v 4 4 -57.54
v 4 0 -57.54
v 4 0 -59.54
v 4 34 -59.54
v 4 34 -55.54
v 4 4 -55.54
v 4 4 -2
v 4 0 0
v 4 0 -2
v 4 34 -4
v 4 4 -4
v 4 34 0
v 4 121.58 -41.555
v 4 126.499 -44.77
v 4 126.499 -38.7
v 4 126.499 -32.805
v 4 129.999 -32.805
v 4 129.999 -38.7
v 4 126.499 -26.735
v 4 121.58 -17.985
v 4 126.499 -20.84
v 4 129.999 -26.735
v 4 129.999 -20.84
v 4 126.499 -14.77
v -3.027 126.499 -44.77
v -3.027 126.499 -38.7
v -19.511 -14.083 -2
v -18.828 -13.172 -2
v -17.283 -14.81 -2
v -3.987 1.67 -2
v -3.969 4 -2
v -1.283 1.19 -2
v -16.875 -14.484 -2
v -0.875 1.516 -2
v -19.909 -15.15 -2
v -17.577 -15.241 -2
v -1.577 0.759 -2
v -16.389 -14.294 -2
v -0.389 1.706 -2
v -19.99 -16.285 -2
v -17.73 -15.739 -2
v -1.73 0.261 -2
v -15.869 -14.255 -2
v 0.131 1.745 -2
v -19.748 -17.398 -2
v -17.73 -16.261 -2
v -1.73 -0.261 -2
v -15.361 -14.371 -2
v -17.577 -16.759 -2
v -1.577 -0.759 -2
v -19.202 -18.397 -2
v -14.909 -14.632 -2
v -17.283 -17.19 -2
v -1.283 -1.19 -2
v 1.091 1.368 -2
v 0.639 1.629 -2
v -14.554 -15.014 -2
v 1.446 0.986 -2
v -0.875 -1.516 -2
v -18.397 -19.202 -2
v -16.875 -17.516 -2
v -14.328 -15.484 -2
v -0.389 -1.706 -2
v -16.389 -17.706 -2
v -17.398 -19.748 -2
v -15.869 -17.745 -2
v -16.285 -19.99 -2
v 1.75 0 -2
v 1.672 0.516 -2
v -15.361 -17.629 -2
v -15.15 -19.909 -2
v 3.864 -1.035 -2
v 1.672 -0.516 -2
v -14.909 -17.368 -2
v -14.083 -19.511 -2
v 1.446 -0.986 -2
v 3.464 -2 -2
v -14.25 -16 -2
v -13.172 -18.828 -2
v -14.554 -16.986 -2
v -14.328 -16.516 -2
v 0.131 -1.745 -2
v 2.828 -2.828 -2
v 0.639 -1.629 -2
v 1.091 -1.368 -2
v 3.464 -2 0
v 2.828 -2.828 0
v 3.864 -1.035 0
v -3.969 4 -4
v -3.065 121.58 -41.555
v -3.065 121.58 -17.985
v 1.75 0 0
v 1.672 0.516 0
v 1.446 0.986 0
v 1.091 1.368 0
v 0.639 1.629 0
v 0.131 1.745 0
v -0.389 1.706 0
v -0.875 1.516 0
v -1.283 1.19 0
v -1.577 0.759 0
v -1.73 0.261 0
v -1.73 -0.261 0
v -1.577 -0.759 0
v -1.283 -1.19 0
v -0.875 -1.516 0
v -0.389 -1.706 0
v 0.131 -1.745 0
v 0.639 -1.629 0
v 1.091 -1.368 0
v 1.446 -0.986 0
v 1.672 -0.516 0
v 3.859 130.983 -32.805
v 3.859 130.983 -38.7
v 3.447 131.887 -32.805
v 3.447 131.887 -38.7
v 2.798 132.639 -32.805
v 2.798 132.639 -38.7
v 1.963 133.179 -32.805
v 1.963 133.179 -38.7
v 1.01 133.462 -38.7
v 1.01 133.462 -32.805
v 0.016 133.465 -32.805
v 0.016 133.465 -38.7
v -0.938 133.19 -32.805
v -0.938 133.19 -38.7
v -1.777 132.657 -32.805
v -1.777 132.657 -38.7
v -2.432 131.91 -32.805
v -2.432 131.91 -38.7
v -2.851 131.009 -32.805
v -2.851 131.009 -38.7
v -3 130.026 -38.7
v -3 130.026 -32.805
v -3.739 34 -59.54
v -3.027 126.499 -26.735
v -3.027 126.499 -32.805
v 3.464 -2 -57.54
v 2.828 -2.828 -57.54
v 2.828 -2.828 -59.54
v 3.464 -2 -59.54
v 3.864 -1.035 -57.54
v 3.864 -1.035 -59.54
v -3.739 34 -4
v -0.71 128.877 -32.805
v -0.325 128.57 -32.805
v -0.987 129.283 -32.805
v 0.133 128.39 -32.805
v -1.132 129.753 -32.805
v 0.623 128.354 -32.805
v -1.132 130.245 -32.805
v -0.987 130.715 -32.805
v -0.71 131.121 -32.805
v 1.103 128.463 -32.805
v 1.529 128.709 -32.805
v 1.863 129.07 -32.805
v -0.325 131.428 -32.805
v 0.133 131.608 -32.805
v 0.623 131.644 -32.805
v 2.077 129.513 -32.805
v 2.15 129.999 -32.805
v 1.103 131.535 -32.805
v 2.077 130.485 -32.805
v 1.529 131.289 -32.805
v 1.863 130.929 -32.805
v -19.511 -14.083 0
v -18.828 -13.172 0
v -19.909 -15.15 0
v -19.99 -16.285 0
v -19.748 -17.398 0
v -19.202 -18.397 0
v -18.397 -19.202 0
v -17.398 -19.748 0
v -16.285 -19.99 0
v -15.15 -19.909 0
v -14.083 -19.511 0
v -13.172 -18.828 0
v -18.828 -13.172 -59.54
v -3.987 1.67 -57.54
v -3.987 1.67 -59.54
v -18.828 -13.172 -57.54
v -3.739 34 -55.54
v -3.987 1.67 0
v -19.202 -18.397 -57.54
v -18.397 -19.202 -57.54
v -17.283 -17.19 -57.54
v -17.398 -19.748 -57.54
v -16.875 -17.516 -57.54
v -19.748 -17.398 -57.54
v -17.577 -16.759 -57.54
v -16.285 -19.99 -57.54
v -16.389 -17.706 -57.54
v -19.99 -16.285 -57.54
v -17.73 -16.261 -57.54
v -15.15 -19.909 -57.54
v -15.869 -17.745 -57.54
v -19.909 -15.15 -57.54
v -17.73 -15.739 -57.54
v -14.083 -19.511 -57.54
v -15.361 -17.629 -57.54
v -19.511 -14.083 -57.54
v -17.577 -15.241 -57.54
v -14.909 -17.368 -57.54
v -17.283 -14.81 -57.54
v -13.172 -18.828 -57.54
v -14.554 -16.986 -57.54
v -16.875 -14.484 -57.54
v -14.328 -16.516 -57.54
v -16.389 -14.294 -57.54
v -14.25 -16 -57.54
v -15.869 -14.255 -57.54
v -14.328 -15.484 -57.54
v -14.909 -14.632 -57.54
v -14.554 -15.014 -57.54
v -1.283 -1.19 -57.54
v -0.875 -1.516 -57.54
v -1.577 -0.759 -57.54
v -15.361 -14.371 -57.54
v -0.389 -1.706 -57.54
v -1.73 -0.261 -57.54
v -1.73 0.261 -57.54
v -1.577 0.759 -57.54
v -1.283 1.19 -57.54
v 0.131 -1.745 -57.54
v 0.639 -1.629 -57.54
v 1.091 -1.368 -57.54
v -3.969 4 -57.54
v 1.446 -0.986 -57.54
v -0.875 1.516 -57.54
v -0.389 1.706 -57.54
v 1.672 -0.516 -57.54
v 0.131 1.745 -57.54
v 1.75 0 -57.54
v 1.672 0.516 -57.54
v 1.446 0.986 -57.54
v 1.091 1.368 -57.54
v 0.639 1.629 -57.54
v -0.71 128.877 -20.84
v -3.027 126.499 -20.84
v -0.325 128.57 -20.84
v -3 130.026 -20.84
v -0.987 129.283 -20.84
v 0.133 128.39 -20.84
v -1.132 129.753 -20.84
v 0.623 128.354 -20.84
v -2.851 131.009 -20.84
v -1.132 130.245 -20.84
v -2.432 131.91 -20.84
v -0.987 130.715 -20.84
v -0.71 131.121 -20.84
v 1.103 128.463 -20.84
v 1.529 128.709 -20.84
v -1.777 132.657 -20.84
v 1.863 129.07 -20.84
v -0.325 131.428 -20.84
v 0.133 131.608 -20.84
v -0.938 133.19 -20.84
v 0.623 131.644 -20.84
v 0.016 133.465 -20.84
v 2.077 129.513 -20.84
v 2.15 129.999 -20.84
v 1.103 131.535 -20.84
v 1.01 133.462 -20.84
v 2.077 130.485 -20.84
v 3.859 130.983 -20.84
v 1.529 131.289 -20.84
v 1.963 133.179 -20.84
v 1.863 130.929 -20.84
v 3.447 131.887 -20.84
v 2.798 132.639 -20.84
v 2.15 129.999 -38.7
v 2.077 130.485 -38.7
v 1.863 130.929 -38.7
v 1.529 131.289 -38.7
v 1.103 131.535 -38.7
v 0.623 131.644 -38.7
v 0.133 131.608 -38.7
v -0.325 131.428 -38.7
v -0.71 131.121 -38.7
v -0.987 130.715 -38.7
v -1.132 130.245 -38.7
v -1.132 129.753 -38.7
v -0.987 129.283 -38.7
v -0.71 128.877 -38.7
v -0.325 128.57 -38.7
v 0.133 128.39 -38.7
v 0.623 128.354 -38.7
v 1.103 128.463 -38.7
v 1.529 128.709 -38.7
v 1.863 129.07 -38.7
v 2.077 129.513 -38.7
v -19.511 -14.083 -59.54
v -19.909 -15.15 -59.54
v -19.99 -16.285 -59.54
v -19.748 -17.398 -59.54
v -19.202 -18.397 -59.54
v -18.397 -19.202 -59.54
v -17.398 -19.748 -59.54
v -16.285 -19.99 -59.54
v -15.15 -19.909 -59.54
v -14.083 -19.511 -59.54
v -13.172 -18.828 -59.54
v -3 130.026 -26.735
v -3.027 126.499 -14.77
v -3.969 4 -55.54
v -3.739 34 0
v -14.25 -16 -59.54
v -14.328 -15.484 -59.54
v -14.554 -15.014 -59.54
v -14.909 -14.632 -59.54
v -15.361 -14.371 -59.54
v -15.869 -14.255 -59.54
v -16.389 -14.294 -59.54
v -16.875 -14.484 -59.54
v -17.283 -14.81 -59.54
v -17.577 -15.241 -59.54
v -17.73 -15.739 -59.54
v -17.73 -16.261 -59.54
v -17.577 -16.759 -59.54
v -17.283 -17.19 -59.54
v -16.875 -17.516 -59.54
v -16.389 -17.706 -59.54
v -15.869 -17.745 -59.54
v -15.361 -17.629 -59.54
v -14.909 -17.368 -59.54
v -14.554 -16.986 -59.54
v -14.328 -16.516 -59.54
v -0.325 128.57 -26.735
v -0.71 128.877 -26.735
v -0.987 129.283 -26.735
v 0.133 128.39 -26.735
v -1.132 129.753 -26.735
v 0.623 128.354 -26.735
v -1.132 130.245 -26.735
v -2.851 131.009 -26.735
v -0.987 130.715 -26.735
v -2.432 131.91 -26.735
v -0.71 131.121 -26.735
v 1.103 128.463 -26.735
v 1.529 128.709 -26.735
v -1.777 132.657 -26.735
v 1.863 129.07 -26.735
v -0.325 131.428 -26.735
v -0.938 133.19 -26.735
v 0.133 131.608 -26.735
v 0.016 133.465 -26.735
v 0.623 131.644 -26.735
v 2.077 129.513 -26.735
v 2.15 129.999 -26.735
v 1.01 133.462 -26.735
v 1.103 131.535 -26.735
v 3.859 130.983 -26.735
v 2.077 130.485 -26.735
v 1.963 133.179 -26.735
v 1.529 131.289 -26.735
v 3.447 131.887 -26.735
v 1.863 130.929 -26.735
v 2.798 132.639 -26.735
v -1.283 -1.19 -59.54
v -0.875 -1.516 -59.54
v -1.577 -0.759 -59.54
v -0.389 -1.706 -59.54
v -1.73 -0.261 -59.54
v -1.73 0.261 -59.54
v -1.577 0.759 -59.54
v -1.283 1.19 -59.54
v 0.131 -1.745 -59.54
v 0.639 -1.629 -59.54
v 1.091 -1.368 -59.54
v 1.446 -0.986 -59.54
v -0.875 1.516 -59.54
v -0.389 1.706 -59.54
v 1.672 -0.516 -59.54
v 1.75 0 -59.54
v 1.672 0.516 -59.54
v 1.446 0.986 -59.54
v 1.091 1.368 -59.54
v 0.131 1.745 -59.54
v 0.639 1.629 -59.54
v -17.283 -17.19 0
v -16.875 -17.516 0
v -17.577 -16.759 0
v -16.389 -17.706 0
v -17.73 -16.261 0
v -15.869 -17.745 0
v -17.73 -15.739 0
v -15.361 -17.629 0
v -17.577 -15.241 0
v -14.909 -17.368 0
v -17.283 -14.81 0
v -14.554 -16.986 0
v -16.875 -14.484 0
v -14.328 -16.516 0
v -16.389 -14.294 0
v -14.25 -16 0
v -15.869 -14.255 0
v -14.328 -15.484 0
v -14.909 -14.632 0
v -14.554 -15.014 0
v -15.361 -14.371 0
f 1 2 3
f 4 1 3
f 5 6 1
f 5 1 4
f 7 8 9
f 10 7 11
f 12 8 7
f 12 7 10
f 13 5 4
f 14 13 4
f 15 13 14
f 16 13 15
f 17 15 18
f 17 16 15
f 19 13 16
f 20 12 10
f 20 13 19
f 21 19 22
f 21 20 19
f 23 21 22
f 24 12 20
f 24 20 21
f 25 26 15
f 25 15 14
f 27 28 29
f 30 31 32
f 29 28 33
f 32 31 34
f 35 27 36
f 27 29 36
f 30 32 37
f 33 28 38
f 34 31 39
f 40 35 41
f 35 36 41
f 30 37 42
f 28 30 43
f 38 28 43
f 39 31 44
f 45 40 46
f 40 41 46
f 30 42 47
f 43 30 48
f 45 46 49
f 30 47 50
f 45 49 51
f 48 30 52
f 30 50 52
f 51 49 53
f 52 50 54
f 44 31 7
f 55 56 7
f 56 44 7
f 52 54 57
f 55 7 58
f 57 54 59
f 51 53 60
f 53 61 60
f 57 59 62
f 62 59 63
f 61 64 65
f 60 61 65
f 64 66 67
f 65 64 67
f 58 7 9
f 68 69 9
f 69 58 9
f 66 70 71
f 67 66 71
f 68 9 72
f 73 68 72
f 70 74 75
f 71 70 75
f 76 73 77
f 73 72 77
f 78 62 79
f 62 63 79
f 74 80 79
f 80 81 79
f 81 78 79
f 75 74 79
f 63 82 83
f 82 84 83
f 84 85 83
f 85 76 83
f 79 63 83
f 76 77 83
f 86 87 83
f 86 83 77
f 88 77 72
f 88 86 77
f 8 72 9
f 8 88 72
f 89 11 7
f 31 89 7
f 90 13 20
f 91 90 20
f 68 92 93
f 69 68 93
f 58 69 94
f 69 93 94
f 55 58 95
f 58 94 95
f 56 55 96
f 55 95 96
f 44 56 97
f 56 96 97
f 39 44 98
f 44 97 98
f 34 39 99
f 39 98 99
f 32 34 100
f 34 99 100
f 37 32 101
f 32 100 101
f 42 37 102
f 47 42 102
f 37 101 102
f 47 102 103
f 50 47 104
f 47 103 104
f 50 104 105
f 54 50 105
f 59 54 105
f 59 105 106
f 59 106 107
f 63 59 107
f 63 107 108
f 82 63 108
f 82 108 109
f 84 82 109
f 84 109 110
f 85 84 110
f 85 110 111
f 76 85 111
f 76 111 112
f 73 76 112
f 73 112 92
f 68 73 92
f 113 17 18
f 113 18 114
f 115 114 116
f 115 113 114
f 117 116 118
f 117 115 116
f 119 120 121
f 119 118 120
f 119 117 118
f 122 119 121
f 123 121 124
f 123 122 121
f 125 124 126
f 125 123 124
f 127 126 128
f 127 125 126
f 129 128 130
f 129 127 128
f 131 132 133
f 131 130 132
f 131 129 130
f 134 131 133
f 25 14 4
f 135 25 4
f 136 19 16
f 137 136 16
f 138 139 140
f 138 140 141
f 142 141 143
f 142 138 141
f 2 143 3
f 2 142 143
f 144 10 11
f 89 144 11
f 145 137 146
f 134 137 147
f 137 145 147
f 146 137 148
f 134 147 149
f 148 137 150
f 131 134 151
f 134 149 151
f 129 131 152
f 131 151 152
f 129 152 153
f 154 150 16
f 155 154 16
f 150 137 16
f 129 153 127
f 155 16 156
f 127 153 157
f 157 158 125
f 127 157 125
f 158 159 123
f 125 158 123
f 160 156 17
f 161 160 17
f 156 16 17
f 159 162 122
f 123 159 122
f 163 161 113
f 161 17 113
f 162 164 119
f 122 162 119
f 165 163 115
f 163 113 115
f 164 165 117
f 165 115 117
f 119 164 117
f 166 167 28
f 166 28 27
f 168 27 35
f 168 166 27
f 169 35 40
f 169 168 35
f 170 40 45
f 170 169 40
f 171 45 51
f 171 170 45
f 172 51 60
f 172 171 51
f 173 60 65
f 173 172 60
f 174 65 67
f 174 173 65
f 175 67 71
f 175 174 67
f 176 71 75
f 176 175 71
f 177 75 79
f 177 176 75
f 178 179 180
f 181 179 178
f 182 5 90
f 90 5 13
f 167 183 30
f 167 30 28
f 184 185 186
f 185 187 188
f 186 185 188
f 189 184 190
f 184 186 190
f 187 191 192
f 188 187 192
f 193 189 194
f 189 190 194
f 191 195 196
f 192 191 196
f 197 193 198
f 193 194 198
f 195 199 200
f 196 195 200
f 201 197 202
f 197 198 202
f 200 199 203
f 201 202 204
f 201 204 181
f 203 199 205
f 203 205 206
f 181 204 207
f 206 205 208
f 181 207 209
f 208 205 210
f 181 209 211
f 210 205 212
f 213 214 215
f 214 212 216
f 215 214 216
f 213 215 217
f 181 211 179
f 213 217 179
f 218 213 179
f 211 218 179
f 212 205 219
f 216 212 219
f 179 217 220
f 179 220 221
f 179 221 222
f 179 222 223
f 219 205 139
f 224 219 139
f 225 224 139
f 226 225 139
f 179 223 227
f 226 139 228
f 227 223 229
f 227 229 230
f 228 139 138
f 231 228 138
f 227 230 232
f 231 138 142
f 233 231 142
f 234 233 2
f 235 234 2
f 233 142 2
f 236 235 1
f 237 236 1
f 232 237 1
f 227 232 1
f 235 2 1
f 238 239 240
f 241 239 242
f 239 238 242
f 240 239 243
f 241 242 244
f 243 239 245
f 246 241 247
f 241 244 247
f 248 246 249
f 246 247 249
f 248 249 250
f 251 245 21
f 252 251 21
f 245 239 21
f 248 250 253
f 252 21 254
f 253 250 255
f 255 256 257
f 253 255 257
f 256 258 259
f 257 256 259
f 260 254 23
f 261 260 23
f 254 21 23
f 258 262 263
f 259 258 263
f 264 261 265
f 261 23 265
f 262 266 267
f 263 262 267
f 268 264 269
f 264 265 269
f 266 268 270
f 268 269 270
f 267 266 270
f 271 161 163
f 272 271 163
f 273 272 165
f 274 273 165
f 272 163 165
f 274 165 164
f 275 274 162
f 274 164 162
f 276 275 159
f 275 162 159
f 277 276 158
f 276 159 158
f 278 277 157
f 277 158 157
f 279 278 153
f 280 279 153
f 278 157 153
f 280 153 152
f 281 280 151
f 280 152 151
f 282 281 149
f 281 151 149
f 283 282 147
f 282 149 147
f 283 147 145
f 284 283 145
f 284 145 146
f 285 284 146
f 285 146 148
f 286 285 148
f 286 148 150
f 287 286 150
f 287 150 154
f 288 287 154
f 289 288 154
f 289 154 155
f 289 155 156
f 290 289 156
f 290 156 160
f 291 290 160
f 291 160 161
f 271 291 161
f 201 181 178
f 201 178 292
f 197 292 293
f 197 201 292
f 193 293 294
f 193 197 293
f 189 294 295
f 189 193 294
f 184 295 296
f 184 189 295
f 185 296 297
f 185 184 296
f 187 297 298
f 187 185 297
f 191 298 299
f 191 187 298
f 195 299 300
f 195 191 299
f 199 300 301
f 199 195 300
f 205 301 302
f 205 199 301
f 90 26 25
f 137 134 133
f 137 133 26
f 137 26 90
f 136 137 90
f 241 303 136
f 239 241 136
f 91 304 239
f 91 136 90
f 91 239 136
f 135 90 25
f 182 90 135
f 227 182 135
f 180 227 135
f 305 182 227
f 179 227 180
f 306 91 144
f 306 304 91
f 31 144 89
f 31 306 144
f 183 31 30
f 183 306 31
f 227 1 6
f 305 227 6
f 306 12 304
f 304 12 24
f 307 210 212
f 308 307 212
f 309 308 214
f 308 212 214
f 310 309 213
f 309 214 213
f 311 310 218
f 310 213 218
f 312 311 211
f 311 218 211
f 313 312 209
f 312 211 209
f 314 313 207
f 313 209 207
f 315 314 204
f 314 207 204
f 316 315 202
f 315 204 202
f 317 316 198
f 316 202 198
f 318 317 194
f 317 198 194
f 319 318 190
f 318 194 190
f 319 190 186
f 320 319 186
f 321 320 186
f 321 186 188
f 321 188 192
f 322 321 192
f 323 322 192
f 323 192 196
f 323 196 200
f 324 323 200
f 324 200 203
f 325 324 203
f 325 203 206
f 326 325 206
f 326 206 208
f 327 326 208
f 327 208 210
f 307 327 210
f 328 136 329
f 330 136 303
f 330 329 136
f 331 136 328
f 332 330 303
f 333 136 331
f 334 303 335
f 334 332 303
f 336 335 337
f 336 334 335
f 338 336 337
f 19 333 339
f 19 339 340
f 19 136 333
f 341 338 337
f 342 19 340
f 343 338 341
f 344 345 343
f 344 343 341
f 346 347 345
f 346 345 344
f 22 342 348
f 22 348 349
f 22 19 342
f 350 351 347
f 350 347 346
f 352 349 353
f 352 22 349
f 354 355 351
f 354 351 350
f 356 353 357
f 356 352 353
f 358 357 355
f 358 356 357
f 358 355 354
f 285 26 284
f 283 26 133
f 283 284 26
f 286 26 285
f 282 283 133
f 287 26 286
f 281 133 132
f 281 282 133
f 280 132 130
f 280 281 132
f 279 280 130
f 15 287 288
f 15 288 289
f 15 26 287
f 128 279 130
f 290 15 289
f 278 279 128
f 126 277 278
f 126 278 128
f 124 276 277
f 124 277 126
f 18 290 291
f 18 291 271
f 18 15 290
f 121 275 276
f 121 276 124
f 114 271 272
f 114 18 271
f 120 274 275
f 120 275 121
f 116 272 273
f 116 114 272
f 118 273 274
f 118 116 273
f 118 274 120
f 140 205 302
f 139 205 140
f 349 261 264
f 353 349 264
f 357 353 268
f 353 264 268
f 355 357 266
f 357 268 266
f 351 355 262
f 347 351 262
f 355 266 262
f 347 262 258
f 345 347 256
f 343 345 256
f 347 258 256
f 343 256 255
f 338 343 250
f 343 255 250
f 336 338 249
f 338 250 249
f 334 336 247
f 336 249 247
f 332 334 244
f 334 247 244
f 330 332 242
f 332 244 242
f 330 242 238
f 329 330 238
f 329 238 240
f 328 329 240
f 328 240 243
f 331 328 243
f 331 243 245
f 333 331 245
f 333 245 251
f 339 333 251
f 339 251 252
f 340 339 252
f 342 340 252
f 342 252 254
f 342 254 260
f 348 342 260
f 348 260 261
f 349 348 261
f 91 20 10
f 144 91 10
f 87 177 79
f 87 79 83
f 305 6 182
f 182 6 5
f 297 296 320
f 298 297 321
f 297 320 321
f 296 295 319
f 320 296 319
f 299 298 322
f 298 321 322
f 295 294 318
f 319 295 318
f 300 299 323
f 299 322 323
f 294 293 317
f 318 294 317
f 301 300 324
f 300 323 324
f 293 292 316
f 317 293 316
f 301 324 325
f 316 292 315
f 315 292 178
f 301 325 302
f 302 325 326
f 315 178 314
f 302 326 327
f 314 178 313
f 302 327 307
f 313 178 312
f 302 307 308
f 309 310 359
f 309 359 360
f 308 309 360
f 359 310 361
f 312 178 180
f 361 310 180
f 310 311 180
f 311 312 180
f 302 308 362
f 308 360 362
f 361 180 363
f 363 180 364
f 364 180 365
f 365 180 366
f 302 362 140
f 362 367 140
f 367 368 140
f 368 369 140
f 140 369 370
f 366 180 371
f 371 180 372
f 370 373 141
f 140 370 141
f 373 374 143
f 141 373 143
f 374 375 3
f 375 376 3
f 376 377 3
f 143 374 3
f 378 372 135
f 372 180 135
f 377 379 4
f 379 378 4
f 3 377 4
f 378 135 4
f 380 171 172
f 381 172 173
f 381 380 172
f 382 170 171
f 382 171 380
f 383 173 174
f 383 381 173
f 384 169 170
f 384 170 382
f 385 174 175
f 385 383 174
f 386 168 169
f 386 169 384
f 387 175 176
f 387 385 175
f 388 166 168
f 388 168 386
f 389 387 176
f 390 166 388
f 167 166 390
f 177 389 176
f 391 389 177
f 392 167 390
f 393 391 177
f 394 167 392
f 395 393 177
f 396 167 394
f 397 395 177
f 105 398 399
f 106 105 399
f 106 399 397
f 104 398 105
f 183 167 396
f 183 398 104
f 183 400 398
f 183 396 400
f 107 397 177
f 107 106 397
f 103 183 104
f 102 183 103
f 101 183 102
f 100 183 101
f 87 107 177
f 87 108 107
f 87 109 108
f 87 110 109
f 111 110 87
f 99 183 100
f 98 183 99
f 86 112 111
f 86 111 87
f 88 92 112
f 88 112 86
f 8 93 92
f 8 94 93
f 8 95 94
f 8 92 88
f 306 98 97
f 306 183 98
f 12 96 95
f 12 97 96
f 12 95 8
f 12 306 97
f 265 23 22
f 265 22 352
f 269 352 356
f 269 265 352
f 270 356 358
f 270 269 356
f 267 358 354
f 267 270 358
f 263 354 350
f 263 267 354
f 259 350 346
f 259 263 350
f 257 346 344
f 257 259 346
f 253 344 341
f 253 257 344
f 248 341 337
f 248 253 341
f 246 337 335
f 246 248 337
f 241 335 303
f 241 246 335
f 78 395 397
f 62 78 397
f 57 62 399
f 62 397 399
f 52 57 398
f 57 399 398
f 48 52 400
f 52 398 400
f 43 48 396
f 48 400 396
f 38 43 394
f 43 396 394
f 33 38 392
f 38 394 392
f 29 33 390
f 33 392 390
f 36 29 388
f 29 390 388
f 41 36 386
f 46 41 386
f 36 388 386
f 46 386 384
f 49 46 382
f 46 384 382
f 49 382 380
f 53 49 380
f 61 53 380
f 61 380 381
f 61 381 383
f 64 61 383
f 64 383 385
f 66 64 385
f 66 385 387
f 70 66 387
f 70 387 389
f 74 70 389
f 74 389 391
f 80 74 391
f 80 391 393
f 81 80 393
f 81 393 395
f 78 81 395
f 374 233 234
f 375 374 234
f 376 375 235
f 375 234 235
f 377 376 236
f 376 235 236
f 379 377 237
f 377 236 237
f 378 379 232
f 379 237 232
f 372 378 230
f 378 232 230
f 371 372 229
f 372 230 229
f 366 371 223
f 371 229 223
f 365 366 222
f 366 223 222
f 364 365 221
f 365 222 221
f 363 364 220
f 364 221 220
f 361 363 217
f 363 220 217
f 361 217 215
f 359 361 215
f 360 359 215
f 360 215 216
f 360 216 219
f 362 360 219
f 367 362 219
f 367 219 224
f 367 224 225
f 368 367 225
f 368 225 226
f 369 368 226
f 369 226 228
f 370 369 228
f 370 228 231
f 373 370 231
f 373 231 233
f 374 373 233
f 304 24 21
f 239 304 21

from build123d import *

# Parameters (mm, degrees)
CROQUIS1_R              = 1.75
CROQUIS1_R_2            = 1.65
SALIENTE_EXTRUIR1_DEPTH = 59.54
CROQUIS2_W              = 3.035
CROQUIS2_H              = 7
CROQUIS2_W_2            = 6.07
CORTAR_EXTRUIR1_DEPTH   = 149.131714596


with BuildPart() as part:
    # Croquis1 → Saliente-Extruir1 (new body)
    with BuildSketch(Plane.XY):
        with BuildLine():
            Line((-13.171572875, -18.828427125), (2.828427125, -2.828427125))
            ThreePointArc((2.828427125, -2.828427125), (3.69551813, -1.530733729), (4, 0))
            Line((4, 0), (4, 129.999038458))
            ThreePointArc((4, 129.999038458), (0.513461538, 133.49901257), (-2.99989645, 130.025961336))
            Line((-2.99989645, 130.025961336), (-3.987275146, 1.669579104))
            Line((-3.987275146, 1.669579104), (-18.828427125, -13.171572875))
            ThreePointArc((-18.828427125, -13.171572875), (-18.828427125, -18.828427125), (-13.171572875, -18.828427125))
        make_face()
        Circle(CROQUIS1_R, mode=Mode.SUBTRACT)
        with Locations((-16, -16)):
            Circle(CROQUIS1_R, mode=Mode.SUBTRACT)
        with Locations((0.5, 129.999038458)):
            Circle(CROQUIS1_R_2, mode=Mode.SUBTRACT)
    extrude(amount=-SALIENTE_EXTRUIR1_DEPTH)

    # Croquis2 → Cortar-Extruir1 (cut, through all)
    with BuildSketch(Plane(origin=(4, 0, 0), x_dir=(0, 0, -1), z_dir=(1, 0, 0))):
        Polygon((2, 4), (2, -20), (57.54, -20), (57.54, 4), (55.54, 4), (4, 4), align=None)
        with Locations((28.2525, 129.999038458)):
            Rectangle(CROQUIS2_W, CROQUIS2_H)
        with Locations((31.2875, 129.999038458)):
            Rectangle(CROQUIS2_W, CROQUIS2_H)
        Polygon((4, 34), (4, 4), (55.54, 4), (55.54, 34), (29.77, 34), align=None)
        Polygon((17.984568448, 121.580171608), (4, 34), (29.77, 34), (29.77, 121.580171608), align=None)
        Polygon((29.77, 34), (55.54, 34), (41.555431552, 121.580171608), (29.77, 121.580171608), align=None)
        Polygon((14.77, 126.499038458), (14.77, 133.499038458), (0, 133.499038458), (0, 34), align=None)
        with Locations((17.805, 129.999038458)):
            Rectangle(CROQUIS2_W_2, CROQUIS2_H)
        Polygon((44.77, 126.499038458), (59.54, 34), (59.54, 133.499038458), (44.77, 133.499038458), align=None)
        with Locations((41.735, 129.999038458)):
            Rectangle(CROQUIS2_W_2, CROQUIS2_H)
    extrude(amount=-CORTAR_EXTRUIR1_DEPTH, mode=Mode.SUBTRACT)


solid = part.part
